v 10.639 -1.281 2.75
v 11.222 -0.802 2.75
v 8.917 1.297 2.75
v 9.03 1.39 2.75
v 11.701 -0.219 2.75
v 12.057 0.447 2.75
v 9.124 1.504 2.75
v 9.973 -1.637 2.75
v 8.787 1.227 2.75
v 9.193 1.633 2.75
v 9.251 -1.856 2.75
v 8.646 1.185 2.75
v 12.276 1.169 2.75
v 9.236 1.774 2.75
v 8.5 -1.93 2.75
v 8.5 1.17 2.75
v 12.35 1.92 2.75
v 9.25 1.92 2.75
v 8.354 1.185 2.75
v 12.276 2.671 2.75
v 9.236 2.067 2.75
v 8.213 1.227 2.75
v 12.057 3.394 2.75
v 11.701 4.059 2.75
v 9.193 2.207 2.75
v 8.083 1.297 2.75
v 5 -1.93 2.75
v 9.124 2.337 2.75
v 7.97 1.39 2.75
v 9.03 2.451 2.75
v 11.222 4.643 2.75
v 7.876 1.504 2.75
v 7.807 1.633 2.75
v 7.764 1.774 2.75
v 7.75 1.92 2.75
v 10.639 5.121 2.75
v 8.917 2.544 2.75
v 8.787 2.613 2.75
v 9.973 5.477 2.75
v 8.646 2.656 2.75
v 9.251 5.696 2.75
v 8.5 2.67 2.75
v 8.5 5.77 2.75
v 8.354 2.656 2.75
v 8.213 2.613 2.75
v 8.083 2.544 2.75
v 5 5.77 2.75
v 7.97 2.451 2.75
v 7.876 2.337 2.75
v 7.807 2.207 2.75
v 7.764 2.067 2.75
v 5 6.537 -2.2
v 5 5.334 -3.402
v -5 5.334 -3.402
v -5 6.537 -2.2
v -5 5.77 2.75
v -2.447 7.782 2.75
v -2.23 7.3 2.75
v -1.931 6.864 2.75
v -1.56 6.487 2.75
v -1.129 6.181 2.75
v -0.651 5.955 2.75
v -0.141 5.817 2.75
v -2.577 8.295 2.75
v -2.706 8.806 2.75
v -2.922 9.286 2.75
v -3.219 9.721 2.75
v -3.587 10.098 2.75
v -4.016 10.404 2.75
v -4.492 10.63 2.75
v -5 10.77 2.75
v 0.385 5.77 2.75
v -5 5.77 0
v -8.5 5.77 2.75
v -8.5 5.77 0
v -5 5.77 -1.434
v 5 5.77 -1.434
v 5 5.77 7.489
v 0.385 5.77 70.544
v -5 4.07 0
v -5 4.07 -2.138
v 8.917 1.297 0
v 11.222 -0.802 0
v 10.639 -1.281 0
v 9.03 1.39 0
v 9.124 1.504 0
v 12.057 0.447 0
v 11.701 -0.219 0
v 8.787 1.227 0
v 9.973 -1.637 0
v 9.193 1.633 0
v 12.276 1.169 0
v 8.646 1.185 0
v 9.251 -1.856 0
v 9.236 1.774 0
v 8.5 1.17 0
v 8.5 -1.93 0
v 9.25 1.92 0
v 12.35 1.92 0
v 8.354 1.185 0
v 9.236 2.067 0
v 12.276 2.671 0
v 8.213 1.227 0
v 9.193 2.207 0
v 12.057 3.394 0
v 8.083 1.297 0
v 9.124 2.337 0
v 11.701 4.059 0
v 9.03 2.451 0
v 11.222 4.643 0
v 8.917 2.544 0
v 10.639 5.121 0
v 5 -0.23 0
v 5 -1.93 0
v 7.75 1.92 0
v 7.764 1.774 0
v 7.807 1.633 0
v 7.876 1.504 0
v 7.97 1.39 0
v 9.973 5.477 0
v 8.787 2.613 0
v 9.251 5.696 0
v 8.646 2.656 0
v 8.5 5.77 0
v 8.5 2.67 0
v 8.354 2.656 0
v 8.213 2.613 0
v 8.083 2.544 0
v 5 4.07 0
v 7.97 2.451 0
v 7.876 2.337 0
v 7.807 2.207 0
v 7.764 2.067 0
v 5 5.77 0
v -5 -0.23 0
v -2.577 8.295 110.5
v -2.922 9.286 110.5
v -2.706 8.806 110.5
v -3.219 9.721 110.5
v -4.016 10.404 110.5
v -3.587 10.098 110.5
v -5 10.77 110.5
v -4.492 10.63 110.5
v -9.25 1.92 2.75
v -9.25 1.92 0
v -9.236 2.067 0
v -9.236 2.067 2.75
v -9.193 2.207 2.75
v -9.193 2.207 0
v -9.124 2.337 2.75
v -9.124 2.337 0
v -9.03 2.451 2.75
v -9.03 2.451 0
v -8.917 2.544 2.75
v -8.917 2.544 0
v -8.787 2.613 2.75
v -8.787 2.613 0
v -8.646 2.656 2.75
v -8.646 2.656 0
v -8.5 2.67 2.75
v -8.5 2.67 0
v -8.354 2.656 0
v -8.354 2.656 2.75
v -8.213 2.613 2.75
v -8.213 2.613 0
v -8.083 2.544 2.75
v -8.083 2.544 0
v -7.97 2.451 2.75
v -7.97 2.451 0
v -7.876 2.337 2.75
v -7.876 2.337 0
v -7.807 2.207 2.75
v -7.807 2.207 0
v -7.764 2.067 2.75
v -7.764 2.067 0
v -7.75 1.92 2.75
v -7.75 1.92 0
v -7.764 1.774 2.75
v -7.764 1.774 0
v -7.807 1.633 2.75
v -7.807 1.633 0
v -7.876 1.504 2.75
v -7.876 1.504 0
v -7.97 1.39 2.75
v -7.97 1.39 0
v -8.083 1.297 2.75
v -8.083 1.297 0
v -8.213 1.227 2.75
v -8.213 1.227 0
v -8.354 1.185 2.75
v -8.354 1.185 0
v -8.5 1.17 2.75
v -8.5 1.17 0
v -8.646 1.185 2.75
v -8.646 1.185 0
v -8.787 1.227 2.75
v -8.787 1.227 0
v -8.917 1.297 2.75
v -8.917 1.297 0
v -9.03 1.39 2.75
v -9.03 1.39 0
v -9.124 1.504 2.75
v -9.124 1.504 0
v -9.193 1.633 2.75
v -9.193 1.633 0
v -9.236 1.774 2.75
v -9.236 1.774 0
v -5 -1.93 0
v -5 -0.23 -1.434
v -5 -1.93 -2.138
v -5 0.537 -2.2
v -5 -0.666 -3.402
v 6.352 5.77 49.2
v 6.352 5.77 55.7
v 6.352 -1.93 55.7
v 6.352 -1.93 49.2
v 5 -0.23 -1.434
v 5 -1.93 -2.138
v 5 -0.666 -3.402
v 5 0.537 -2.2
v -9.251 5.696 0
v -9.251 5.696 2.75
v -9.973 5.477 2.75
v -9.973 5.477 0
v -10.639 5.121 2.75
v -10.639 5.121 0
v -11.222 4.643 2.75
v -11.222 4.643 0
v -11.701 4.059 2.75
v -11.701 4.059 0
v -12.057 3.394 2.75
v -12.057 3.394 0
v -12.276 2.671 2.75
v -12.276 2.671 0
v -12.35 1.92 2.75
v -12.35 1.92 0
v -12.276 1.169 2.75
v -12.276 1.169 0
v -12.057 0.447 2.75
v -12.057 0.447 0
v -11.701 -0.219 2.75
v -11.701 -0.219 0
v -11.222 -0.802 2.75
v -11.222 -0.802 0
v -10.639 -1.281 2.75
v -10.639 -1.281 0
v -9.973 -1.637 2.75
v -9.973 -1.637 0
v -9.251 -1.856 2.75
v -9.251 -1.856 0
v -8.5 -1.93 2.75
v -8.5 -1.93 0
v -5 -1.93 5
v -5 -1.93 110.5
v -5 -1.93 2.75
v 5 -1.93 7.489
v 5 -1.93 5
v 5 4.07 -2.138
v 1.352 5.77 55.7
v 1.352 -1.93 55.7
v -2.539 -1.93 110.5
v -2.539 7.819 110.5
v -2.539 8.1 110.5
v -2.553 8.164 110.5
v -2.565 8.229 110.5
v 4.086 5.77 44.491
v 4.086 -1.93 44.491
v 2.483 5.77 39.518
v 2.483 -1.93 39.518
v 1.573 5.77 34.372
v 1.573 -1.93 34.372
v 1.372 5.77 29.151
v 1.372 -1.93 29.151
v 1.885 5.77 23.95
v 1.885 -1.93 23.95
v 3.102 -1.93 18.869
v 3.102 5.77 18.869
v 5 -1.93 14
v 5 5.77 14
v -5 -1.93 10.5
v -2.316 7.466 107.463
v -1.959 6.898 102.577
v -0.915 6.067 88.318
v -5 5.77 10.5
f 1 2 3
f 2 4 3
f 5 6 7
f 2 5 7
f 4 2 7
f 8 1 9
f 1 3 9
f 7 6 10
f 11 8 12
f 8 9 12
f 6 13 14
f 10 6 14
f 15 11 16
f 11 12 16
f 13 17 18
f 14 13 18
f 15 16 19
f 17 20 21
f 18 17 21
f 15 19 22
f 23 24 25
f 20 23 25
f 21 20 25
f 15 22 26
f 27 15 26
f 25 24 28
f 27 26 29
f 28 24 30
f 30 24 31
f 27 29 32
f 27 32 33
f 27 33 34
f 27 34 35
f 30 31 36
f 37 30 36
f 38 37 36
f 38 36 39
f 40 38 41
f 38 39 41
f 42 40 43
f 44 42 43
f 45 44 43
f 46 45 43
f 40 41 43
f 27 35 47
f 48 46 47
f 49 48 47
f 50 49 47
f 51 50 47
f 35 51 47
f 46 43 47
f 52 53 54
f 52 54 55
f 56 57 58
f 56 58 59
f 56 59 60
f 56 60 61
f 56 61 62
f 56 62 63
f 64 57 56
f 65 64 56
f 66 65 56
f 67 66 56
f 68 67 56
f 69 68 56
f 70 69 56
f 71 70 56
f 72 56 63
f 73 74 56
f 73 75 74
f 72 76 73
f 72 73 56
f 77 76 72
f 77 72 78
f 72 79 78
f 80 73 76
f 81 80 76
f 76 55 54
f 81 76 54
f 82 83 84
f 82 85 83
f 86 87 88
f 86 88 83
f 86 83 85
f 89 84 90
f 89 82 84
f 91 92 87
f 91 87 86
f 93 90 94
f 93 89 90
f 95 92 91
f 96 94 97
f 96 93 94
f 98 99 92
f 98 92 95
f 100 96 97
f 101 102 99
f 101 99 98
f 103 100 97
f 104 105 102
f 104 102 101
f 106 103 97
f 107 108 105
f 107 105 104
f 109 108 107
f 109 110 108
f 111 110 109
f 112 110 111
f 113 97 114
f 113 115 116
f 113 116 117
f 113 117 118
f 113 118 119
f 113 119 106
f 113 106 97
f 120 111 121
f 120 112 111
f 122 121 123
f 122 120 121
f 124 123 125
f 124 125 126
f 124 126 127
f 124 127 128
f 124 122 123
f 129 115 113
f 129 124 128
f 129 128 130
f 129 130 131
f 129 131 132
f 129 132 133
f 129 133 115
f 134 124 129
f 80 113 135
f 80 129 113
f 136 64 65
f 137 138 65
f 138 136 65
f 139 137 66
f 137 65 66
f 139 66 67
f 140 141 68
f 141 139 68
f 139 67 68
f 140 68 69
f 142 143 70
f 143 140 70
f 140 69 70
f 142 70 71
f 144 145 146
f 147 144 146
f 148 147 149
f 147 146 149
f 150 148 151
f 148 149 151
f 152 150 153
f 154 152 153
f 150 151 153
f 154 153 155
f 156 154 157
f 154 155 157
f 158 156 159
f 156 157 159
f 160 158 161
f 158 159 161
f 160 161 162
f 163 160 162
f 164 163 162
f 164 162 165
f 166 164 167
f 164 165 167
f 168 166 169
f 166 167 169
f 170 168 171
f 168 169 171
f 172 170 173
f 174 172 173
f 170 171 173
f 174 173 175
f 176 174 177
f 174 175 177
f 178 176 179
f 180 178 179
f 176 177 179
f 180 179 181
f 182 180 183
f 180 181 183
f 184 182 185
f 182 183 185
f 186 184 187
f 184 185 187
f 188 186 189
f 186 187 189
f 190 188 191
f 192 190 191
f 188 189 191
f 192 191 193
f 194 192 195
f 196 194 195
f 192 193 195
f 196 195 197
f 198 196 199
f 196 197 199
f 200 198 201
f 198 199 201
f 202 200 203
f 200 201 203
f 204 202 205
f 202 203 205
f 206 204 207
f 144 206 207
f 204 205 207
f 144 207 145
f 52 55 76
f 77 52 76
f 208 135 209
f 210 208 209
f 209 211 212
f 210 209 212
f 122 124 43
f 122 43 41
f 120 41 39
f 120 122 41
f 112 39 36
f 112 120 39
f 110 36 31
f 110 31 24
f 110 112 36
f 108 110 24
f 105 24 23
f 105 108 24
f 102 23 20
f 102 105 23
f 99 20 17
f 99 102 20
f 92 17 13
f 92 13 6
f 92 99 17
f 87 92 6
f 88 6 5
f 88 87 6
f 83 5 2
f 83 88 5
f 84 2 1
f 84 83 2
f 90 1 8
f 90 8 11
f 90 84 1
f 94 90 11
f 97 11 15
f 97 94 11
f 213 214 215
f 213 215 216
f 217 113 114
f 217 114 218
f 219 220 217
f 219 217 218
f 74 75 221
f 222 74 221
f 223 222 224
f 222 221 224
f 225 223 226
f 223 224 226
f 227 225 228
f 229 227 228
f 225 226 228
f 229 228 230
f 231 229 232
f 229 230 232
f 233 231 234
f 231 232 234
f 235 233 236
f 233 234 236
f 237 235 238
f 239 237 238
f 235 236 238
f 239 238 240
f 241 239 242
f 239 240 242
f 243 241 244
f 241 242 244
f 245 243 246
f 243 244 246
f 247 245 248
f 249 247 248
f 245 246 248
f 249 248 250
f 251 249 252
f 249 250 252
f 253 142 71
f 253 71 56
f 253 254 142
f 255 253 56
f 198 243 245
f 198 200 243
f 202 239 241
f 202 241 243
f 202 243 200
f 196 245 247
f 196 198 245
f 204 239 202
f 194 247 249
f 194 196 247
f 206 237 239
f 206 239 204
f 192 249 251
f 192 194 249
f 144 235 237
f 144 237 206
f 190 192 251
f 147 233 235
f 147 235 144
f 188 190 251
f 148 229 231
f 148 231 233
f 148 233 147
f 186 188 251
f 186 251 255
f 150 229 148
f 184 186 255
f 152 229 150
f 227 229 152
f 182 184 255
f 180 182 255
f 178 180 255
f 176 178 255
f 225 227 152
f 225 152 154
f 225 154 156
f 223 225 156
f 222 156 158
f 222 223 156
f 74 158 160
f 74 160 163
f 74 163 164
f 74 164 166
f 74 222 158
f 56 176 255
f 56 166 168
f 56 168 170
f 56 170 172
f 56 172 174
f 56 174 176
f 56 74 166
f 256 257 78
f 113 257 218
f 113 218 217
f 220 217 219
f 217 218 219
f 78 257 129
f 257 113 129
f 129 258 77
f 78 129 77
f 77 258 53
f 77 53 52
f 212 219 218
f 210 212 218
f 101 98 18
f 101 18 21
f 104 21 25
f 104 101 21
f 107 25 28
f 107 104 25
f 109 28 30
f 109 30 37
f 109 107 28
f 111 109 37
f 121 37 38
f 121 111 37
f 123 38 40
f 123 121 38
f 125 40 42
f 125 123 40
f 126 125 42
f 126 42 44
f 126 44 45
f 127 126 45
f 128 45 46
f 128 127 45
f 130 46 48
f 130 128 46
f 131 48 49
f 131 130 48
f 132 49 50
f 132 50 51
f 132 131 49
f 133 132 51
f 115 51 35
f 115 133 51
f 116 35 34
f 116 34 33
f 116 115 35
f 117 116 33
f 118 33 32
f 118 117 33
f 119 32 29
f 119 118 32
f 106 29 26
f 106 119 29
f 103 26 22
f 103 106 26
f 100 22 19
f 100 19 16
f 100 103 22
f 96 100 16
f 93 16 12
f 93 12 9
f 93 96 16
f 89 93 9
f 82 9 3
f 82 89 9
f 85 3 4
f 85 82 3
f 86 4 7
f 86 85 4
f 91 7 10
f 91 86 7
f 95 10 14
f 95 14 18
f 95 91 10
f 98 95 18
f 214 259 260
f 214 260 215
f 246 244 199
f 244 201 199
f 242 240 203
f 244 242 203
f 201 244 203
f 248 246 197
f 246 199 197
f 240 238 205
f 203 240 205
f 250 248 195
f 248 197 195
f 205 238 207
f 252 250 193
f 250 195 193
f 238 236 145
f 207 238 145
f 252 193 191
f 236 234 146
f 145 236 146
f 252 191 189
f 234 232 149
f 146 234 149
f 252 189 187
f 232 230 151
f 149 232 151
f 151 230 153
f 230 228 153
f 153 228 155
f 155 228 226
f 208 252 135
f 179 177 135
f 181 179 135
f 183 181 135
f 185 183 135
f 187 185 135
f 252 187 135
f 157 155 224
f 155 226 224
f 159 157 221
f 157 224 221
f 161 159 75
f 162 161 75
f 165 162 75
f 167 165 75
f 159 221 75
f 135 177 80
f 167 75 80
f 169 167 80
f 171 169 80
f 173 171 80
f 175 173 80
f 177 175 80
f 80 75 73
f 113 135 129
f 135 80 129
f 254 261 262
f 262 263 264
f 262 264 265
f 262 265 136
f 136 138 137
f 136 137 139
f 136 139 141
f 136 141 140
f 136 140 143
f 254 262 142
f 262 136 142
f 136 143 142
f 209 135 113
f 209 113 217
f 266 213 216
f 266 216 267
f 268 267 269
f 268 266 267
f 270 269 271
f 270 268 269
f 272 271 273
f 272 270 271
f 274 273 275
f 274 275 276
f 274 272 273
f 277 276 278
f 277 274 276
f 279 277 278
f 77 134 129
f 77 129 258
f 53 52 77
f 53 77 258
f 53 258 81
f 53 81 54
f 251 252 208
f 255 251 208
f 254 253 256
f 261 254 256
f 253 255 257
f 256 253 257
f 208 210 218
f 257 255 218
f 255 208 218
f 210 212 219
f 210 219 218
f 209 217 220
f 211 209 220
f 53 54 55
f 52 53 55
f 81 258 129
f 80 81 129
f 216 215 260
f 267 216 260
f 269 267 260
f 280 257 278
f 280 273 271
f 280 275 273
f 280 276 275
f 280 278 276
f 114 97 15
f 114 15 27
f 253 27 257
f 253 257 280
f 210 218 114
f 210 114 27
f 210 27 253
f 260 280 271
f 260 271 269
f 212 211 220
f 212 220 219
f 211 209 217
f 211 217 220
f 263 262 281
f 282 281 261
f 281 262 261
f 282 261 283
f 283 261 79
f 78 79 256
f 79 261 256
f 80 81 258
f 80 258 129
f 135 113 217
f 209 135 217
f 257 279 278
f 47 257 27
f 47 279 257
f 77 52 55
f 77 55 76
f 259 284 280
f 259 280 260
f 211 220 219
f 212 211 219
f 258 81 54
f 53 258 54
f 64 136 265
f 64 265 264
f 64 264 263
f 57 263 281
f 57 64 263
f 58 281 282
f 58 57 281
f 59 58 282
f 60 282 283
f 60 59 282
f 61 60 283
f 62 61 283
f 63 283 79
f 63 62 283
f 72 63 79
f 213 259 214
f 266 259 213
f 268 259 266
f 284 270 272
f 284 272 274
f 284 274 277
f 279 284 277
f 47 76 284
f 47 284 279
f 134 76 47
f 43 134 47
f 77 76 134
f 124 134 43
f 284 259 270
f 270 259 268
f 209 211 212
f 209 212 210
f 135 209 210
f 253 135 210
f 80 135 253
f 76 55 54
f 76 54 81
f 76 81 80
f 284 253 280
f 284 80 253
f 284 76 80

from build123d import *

# Parameters (mm, degrees)
SKETCH2_W           = 10
SKETCH2_H           = 14.768412439
BOSS_EXTRUDE1_DEPTH = 5
BOSS_EXTRUDE4_DEPTH = 10
SKETCH9_W           = 10
SKETCH9_H           = 3.18
SKETCH9_H_2         = 3.888412439
CUT_EXTRUDE3_DEPTH  = 5
BOSS_EXTRUDE5_DEPTH = 7.7
SKETCH12_R          = 0.75
BOSS_EXTRUDE7_DEPTH = 2.75
FILLET1_R           = 2.5
SKETCH13_W          = 13.67386451
SKETCH13_H          = 47.62797089
CUT_EXTRUDE4_DEPTH  = 100
SKETCH14_W          = 10
SKETCH14_H          = 7.7
BOSS_EXTRUDE8_DEPTH = 100
CUT_EXTRUDE5_DEPTH  = 100
SKETCH16_W          = 2.461316474
SKETCH16_H          = 107.75
BOSS_EXTRUDE9_DEPTH = 5
FILLET3_R           = 3
FILLET4_R           = 3


with BuildPart() as part:
    # Sketch2 → Boss-Extrude1 (new body)
    with BuildSketch(Plane.XY):
        with Locations((0, 1.566049366)):
            Rectangle(SKETCH2_W, SKETCH2_H)
    extrude(amount=BOSS_EXTRUDE1_DEPTH)

    # Sketch8 → Boss-Extrude4 (add)
    with BuildSketch(Plane.ZY.offset(5)):
        Polygon((-0.15, 5.770255585), (0, 5.770255585), (0, 4.070255585), (-0.15, 4.070255585), (-2.137867966, 4.070255585), (-3.402081528, 5.334469147), (-2.2, 6.536550675), (-1.43370491, 5.770255585), align=None)
        Polygon((-0.15, -1.929744415), (0, -1.929744415), (0, -0.229744415), (-0.15, -0.229744415), (-1.43370491, -0.229744415), (-2.2, 0.536550675), (-3.402081528, -0.665530853), (-2.137867966, -1.929744415), align=None)
    extrude(amount=-BOSS_EXTRUDE4_DEPTH)

    # Sketch9 → Cut-Extrude3 (cut)
    with BuildSketch(Plane(origin=(0, 0, 0), x_dir=(-1, 0, 0), z_dir=(0, 0, -1))):
        with Locations((0, 7.360255585)):
            Rectangle(SKETCH9_W, SKETCH9_H)
        with Locations((0, -3.873950635)):
            Rectangle(SKETCH9_W, SKETCH9_H_2)
    extrude(amount=-CUT_EXTRUDE3_DEPTH, mode=Mode.SUBTRACT)

    # Sketch10 → Boss-Extrude5 (add)
    with BuildSketch(Plane(origin=(0, 5.770255585, 0), x_dir=(1, 0, 0), z_dir=(0, 1, 0))):
        with BuildLine():
            Line((-5, -5), (-5, -10.5))
            Line((-5, -10.5), (1.352445729, -55.7))
            Line((1.352445729, -55.7), (6.352445729, -55.7))
            Line((6.352445729, -55.7), (6.352445729, -49.2))
            ThreePointArc((6.352445729, -49.2), (1.383429579, -31.764936646), (5, -14))
            Line((5, -14), (5, -5))
            Line((5, -5), (-5, -5))
        make_face()
    extrude(amount=-BOSS_EXTRUDE5_DEPTH)

    # Sketch12 → Boss-Extrude7 (add)
    with BuildSketch(Plane.XY):
        with BuildLine():
            Line((5, 5.770255585), (8.5, 5.770255585))
            ThreePointArc((8.5, 5.770255585), (12.35, 1.920255585), (8.5, -1.929744415))
            Line((8.5, -1.929744415), (5, -1.929744415))
            Line((5, -1.929744415), (5, 5.770255585))
        make_face()
        with Locations((8.5, 1.920255585)):
            Circle(SKETCH12_R, mode=Mode.SUBTRACT)
    extrude(amount=BOSS_EXTRUDE7_DEPTH)


with BuildPart() as body_2:
    # Mirror1: mirrored copy
    add(part.part.mirror(Plane(origin=(0, 0, 0), x_dir=(0, 0, 1), z_dir=(1, 0, 0))))

    # Fillet1
    fillet1_edges = [body_2.edges().sort_by_distance(p)[0] for p in [
        (-6.352445729, 1.920255585, 49.2),
        (-5, 1.920255585, 14),
        (-1.352445729, 1.920255585, 55.7),
        (-6.352445729, 1.920255585, 55.7),
    ]]
    fillet(fillet1_edges, radius=FILLET1_R)

    # Sketch13 → Cut-Extrude4 (cut)
    with BuildSketch(Plane(origin=(0, 5.770255585, 0), x_dir=(1, 0, 0), z_dir=(0, 1, 0))):
        with Locations((-1.836932255, -34.313985445)):
            Rectangle(SKETCH13_W, SKETCH13_H)
    extrude(amount=-CUT_EXTRUDE4_DEPTH, mode=Mode.SUBTRACT)

    # Sketch14 → Boss-Extrude8 (add)
    with BuildSketch(Plane.XY.offset(10.5)):
        with Locations((0, 1.920255585)):
            Rectangle(SKETCH14_W, SKETCH14_H)
    extrude(amount=BOSS_EXTRUDE8_DEPTH)

    # Sketch15 → Cut-Extrude5 (cut)
    with BuildSketch(Plane(origin=(0, 5.770255585, 0), x_dir=(1, 0, 0), z_dir=(0, 1, 0))):
        Polygon((5, -7.489382654), (-2.538683526, -110.5), (5, -110.5), align=None)
    extrude(amount=-CUT_EXTRUDE5_DEPTH, mode=Mode.SUBTRACT)

    # Sketch16 → Boss-Extrude9 (add)
    with BuildSketch(Plane(origin=(0, 5.770255585, 0), x_dir=(1, 0, 0), z_dir=(0, 1, 0))):
        with Locations((-3.769341763, -56.625)):
            Rectangle(SKETCH16_W, SKETCH16_H)
    extrude(amount=BOSS_EXTRUDE9_DEPTH)

    # Fillet3
    # the kernel refuses this fillet: 3 mm, written as the material it takes off along each edge
    with BuildSketch(Plane(origin=(-2.538683526, 10.770255585, -4.628101068), x_dir=(-1, 0, 0), z_dir=(0, 0, 1))) as fillet3_piece_1:
        with BuildLine():
            CenterArc((3, 2.951240427), FILLET3_R, 180, 79.655799439)
            Line((0, 2.951240427), (-0.06, 2.951240427))
            Line((-0.06, 2.951240427), (-0.06, 0))
            Line((-0.06, 0), (0, -0.06))
            ThreePointArc((0, -0.06), (1.230658237, -0.06), (2.450542803, -0.059024809))
            Line((2.450542803, -0.059024809), (2.461316474, 0))
        make_face()
    extrude(amount=122.506202136, mode=Mode.SUBTRACT)

    # Fillet4
    # the kernel refuses this fillet: 3 mm, written as the material it adds along each edge
    with BuildSketch(Plane(origin=(-2.538683526, 5.770255585, 2.75), x_dir=(1, 0, 0), z_dir=(0, 0, 1))) as fillet4_piece_1_section:
        with BuildLine():
            CenterArc((2.924115263, 3), FILLET4_R, 189.122166889, 80.877833111)
            Line((-0.037942368, 2.524379786), (-0.334148132, 2.476817765))
            ThreePointArc((-0.334148132, 2.476817765), (-0.3, 2.048759573), (-0.3, 0))
            Line((-0.3, 0), (0, -0.3))
            Line((0, -0.3), (2.924115263, -0.3))
            Line((2.924115263, -0.3), (2.924115263, 0))
        make_face()
    fillet4_piece_1 = extrude(amount=107.75, mode=Mode.PRIVATE)
    fillet4_piece_1 = split(fillet4_piece_1, bisect_by=Plane(origin=(1.704380037, 6.352962356, 52.521628105), z_dir=(-0.9973327924630033, 0, -0.07298836261999549)), keep=Keep.TOP, mode=Mode.PRIVATE)
    add(fillet4_piece_1)


solid = Compound([part.part, body_2.part])
